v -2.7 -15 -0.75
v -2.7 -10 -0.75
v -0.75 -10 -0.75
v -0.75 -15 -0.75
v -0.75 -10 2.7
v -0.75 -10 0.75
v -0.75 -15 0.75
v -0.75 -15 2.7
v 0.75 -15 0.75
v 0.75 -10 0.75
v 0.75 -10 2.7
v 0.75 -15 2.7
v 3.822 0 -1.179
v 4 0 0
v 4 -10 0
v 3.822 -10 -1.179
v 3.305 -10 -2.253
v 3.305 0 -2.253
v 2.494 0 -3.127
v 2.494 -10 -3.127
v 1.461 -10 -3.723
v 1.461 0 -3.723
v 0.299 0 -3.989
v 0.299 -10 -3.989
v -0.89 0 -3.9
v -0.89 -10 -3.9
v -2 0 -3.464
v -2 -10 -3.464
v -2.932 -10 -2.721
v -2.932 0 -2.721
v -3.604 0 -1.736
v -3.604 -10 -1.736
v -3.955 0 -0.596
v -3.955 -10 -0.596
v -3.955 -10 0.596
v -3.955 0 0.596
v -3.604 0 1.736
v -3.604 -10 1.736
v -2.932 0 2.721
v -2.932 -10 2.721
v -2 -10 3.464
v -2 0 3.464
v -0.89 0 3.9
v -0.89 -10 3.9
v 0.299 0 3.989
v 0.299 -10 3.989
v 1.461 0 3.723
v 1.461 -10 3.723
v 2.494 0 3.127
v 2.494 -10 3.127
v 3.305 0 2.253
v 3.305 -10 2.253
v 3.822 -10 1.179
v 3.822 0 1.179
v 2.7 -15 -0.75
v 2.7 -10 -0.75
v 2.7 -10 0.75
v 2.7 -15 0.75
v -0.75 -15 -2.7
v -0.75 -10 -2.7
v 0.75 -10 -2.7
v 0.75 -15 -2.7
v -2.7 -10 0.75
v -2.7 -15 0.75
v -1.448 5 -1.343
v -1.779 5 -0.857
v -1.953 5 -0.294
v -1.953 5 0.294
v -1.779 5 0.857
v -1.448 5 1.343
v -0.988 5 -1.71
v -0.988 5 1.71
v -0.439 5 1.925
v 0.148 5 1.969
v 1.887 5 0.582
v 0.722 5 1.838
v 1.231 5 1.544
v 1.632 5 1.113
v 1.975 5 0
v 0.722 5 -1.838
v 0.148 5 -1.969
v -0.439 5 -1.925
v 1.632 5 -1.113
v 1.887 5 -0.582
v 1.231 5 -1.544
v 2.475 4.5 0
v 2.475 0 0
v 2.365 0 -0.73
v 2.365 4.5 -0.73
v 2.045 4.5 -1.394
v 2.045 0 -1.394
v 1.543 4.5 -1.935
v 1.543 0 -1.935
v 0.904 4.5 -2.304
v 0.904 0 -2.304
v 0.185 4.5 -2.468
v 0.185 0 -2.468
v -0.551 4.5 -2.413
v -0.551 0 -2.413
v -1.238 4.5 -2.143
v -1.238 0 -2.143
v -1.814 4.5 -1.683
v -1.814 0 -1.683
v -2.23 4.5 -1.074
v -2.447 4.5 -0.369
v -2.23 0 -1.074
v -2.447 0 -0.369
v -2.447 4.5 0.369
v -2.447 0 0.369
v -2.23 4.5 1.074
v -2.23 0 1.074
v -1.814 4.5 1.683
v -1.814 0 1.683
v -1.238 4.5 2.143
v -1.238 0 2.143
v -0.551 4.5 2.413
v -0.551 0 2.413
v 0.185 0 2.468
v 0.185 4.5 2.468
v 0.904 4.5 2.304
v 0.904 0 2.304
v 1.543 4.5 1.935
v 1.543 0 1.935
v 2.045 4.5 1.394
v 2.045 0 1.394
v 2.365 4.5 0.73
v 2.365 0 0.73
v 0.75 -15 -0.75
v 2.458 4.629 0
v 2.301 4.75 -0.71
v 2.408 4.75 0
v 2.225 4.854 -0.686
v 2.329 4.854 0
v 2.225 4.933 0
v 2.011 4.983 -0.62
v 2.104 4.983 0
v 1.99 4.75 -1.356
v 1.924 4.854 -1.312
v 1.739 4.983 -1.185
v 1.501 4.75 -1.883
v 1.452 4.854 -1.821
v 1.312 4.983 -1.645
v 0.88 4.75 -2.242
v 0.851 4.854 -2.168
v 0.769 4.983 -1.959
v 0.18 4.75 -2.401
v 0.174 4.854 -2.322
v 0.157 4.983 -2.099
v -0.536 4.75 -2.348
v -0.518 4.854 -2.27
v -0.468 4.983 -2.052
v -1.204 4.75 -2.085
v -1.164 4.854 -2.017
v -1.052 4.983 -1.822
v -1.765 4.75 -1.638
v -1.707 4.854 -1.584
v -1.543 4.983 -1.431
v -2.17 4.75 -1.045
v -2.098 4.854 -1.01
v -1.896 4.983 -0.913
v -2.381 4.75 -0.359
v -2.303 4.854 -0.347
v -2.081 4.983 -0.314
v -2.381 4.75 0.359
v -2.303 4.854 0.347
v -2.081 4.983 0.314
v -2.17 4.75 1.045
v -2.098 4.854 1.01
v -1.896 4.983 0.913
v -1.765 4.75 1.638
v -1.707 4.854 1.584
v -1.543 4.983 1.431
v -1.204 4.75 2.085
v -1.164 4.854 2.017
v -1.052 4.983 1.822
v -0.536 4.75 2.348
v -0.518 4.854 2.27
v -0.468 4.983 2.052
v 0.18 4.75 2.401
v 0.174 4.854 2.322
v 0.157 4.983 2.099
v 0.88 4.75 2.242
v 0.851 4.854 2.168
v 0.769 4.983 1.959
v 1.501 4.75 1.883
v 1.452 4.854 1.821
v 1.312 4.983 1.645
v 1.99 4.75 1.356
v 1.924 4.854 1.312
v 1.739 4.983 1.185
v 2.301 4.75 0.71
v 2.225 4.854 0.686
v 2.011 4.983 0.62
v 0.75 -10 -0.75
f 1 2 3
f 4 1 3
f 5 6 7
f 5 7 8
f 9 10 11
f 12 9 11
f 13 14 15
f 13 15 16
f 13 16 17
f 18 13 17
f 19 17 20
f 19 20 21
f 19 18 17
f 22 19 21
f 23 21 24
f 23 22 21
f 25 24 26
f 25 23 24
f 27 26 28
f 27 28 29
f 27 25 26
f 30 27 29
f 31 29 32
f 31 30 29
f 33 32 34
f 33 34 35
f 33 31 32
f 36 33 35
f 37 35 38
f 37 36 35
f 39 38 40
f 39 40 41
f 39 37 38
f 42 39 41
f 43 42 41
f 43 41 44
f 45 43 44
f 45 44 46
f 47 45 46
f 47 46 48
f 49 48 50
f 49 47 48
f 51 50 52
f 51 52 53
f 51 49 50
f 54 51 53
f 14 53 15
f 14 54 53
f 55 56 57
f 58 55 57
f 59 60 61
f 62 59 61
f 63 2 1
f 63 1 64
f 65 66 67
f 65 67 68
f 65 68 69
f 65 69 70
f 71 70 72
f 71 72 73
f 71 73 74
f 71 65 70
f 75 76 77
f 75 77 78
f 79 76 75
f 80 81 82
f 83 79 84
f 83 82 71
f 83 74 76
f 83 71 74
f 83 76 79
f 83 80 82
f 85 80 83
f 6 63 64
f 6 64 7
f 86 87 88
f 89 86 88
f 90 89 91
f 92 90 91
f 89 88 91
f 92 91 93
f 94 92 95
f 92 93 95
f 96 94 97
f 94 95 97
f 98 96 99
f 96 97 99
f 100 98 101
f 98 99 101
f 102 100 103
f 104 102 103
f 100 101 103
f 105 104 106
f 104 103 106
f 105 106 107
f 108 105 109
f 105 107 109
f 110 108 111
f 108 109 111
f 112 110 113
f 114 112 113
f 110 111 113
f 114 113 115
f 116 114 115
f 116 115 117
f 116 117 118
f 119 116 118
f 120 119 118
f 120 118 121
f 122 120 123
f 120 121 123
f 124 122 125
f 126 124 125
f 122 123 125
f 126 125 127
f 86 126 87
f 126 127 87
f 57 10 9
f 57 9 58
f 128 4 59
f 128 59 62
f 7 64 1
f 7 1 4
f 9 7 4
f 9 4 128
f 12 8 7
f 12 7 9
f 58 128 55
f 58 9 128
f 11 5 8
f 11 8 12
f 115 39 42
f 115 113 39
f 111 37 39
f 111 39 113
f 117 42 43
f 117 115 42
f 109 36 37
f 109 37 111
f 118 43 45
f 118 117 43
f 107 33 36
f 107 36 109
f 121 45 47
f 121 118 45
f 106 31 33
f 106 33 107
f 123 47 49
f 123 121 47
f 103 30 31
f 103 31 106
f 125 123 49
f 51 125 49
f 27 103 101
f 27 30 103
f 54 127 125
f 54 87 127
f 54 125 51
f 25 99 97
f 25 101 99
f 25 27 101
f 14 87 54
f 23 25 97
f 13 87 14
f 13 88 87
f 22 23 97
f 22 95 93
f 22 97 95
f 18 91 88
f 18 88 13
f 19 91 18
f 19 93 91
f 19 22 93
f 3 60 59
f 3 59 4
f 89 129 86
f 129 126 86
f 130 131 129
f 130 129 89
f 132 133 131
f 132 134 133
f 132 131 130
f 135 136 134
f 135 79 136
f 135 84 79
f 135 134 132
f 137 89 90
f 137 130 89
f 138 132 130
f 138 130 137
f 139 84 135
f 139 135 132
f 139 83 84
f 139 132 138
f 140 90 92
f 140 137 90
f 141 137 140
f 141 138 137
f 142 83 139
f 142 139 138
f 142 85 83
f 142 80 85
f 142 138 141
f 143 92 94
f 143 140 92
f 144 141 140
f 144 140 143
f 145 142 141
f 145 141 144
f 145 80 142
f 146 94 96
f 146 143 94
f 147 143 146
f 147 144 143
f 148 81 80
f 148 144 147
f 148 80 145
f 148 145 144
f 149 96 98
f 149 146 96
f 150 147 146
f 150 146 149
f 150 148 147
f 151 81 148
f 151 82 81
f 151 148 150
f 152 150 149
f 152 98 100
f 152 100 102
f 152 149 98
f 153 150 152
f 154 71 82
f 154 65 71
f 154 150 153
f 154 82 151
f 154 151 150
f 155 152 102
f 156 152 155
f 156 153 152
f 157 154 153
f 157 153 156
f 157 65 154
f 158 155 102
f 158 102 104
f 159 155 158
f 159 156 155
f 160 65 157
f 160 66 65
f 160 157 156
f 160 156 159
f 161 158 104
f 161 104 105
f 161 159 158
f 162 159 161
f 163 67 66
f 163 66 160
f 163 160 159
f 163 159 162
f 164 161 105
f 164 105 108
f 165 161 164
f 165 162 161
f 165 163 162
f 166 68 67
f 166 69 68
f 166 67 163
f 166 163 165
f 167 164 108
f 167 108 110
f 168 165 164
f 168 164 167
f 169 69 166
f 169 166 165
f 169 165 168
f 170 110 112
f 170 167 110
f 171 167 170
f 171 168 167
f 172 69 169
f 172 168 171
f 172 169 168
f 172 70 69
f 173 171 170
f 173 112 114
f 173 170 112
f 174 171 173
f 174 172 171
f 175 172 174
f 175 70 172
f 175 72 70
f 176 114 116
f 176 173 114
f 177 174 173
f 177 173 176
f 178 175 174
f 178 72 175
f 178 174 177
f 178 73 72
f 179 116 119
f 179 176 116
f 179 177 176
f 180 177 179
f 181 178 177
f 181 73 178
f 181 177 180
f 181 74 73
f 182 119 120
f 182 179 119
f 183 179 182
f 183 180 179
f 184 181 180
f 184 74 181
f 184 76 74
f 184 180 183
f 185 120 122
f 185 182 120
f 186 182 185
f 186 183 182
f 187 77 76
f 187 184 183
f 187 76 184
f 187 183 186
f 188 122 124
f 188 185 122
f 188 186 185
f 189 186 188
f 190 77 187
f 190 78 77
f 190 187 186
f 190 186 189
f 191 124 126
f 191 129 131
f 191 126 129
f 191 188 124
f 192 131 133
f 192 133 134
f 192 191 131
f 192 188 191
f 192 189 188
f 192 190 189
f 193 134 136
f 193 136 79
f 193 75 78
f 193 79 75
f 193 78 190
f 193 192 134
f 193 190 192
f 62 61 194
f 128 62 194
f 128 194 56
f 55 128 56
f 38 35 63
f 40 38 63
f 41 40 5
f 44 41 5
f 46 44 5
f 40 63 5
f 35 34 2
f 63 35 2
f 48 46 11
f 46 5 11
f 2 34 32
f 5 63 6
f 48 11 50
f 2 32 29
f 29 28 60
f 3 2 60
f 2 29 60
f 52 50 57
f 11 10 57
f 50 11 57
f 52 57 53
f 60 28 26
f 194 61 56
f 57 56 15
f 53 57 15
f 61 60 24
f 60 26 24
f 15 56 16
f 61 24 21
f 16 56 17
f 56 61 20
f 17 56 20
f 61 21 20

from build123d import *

# Parameters (mm, degrees)
SKETCH1_R           = 4
BOSS_EXTRUDE1_DEPTH = 10
SKETCH2_R           = 2.475
BOSS_EXTRUDE2_DEPTH = 5
SKETCH3_W           = 1.5
SKETCH3_H           = 5.4
SKETCH3_W_2         = 5.4
SKETCH3_H_2         = 1.5
BOSS_EXTRUDE3_DEPTH = 5
FILLET3_R           = 0.5


with BuildPart() as part:
    # Sketch1 → Boss-Extrude1 (new body)
    with BuildSketch(Plane(origin=(0, 0, 0), x_dir=(1, 0, 0), z_dir=(0, 1, 0))):
        Circle(SKETCH1_R)
    extrude(amount=-BOSS_EXTRUDE1_DEPTH)

    # Sketch2 → Boss-Extrude2 (add)
    with BuildSketch(Plane(origin=(0, 0, 0), x_dir=(1, 0, 0), z_dir=(0, 1, 0))):
        Circle(SKETCH2_R)
    extrude(amount=BOSS_EXTRUDE2_DEPTH)

    # Sketch3 → Boss-Extrude3 (add)
    with BuildSketch(Plane.XZ.offset(10)):
        Rectangle(SKETCH3_W, SKETCH3_H)
        Rectangle(SKETCH3_W_2, SKETCH3_H_2)
    extrude(amount=BOSS_EXTRUDE3_DEPTH)

    # Fillet3
    fillet3_edges = [part.edges().sort_by_distance(p)[0] for p in [
        (-2.475, 5, 0),
    ]]
    fillet(fillet3_edges, radius=FILLET3_R)


solid = part.part
